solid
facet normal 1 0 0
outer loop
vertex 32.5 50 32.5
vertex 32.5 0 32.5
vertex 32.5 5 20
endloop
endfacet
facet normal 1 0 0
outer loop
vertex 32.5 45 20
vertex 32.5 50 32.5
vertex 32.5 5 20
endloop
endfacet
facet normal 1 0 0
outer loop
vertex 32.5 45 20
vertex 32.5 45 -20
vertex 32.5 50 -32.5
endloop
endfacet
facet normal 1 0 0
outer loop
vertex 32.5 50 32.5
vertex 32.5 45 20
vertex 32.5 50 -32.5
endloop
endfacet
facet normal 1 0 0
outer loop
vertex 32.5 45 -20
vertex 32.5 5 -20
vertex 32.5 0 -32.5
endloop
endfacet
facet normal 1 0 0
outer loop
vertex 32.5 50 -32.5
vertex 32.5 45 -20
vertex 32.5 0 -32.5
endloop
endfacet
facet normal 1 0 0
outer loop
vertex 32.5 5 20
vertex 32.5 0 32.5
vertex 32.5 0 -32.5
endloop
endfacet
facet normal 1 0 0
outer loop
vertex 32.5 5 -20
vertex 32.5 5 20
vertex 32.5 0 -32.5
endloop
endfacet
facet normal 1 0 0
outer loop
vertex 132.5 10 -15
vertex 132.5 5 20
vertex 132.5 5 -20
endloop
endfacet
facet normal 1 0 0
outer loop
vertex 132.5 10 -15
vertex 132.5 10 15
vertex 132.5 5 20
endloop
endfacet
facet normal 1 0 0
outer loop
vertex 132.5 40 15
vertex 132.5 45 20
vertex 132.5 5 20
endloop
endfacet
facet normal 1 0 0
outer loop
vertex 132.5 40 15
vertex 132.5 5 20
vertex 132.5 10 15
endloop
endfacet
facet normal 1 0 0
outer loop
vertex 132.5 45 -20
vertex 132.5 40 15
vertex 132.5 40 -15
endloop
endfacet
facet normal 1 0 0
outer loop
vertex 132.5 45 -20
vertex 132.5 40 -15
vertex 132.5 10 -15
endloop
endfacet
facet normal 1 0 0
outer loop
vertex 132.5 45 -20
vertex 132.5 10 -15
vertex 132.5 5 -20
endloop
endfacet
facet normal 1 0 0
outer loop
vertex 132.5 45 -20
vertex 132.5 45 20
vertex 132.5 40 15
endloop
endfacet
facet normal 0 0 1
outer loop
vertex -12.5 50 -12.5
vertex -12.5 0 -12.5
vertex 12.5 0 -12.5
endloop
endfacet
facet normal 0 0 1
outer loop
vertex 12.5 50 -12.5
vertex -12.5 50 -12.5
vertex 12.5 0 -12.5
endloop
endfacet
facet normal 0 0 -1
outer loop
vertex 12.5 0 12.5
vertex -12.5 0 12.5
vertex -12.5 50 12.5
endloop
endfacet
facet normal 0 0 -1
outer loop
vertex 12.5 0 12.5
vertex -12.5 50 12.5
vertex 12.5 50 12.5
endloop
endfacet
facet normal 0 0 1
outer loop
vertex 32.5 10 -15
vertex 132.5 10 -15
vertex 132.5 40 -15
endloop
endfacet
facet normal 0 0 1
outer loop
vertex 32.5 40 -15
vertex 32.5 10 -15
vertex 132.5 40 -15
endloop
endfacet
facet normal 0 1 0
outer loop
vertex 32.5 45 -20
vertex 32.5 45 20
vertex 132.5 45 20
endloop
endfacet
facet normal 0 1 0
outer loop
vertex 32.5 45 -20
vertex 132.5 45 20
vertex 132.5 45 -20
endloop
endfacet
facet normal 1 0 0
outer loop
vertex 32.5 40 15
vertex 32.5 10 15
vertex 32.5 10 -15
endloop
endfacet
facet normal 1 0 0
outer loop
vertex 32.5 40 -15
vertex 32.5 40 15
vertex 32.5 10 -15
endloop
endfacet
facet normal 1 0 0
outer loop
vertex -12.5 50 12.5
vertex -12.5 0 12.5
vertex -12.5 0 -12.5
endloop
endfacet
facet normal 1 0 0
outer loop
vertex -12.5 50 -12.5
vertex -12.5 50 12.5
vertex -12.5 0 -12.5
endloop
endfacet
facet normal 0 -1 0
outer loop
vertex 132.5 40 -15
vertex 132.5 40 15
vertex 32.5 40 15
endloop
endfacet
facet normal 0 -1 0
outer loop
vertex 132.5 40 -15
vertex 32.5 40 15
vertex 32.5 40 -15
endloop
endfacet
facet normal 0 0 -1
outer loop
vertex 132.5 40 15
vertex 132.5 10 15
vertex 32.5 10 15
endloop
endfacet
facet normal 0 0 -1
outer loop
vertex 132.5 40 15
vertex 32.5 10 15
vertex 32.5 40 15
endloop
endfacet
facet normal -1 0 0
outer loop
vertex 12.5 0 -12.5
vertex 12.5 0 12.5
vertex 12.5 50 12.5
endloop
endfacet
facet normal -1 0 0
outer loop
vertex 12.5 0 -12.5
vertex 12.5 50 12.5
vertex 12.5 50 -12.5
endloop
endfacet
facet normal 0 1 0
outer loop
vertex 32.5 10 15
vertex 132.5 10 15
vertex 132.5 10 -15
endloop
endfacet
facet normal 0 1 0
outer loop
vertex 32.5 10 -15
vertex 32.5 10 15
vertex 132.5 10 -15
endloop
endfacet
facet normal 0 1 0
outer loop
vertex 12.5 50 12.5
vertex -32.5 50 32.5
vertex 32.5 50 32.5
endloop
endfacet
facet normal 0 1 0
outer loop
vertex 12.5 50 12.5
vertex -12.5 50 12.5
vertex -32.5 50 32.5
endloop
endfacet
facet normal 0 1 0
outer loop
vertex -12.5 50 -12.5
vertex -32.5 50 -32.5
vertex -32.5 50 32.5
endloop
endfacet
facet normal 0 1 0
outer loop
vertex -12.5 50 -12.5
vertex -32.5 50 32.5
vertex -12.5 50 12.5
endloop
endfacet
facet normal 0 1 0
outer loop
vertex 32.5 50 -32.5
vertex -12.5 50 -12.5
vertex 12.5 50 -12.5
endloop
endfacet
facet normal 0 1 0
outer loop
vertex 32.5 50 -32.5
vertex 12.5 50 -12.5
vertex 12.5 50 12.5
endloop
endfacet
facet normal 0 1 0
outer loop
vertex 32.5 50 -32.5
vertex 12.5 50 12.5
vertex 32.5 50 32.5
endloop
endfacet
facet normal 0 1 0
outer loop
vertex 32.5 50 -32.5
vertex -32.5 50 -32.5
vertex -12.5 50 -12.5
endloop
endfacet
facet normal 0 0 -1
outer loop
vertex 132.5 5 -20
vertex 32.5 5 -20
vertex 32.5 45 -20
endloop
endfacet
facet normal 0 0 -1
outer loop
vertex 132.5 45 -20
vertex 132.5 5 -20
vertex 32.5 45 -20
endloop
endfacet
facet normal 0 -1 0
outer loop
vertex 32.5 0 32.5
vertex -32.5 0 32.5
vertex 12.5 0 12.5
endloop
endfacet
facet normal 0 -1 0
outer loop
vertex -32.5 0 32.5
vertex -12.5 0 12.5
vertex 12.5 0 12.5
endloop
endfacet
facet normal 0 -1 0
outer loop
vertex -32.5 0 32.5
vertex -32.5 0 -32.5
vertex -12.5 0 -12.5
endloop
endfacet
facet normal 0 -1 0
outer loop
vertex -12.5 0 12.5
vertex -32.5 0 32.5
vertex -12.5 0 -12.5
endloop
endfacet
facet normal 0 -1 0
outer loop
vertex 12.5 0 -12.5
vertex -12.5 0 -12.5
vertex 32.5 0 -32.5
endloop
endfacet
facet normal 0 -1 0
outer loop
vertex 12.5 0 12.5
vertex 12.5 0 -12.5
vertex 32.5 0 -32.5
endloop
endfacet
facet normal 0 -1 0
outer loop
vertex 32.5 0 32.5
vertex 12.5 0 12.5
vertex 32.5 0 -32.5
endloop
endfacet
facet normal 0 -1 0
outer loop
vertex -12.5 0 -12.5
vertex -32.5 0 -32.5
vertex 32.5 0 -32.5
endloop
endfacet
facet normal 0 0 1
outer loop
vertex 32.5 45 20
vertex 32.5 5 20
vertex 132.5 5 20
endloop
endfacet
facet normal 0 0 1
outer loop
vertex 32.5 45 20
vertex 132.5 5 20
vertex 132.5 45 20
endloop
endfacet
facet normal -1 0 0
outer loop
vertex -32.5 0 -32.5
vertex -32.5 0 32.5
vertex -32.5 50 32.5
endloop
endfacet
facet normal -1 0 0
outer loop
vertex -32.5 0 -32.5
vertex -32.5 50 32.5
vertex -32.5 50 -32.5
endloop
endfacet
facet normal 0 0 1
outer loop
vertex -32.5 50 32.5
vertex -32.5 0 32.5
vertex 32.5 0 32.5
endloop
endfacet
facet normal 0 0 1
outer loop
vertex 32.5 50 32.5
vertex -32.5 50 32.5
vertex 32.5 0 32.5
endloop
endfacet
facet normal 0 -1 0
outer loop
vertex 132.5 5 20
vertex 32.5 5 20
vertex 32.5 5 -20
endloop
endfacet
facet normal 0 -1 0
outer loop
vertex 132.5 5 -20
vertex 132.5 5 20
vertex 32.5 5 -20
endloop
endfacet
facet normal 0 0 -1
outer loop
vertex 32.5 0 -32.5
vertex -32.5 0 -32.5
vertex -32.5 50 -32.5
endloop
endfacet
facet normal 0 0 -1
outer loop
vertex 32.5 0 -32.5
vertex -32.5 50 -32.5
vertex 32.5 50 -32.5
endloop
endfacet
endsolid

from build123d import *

# Parameters (mm, degrees)
SKETCH1_W           = 65
SKETCH1_H           = 65
SKETCH1_W_2         = 25
SKETCH1_H_2         = 25
BOSS_EXTRUDE1_DEPTH = 50
SKETCH2_W           = 40
SKETCH2_H           = 40
SKETCH2_W_2         = 30
SKETCH2_H_2         = 30
BOSS_EXTRUDE2_DEPTH = 100


with BuildPart() as part:
    # Sketch1 → Boss-Extrude1 (new body)
    with BuildSketch(Plane(origin=(0, 0, 0), x_dir=(1, 0, 0), z_dir=(0, 1, 0))):
        Rectangle(SKETCH1_W, SKETCH1_H)
        Rectangle(SKETCH1_W_2, SKETCH1_H_2, mode=Mode.SUBTRACT)
    extrude(amount=BOSS_EXTRUDE1_DEPTH)

    # Sketch2 → Boss-Extrude2 (add)
    with BuildSketch(Plane(origin=(32.5, 0, 0), x_dir=(0, 0, -1), z_dir=(1, 0, 0))):
        with Locations((0, 25)):
            Rectangle(SKETCH2_W, SKETCH2_H)
        with Locations((0, 25)):
            Rectangle(SKETCH2_W_2, SKETCH2_H_2, mode=Mode.SUBTRACT)
    extrude(amount=BOSS_EXTRUDE2_DEPTH)


solid = part.part
